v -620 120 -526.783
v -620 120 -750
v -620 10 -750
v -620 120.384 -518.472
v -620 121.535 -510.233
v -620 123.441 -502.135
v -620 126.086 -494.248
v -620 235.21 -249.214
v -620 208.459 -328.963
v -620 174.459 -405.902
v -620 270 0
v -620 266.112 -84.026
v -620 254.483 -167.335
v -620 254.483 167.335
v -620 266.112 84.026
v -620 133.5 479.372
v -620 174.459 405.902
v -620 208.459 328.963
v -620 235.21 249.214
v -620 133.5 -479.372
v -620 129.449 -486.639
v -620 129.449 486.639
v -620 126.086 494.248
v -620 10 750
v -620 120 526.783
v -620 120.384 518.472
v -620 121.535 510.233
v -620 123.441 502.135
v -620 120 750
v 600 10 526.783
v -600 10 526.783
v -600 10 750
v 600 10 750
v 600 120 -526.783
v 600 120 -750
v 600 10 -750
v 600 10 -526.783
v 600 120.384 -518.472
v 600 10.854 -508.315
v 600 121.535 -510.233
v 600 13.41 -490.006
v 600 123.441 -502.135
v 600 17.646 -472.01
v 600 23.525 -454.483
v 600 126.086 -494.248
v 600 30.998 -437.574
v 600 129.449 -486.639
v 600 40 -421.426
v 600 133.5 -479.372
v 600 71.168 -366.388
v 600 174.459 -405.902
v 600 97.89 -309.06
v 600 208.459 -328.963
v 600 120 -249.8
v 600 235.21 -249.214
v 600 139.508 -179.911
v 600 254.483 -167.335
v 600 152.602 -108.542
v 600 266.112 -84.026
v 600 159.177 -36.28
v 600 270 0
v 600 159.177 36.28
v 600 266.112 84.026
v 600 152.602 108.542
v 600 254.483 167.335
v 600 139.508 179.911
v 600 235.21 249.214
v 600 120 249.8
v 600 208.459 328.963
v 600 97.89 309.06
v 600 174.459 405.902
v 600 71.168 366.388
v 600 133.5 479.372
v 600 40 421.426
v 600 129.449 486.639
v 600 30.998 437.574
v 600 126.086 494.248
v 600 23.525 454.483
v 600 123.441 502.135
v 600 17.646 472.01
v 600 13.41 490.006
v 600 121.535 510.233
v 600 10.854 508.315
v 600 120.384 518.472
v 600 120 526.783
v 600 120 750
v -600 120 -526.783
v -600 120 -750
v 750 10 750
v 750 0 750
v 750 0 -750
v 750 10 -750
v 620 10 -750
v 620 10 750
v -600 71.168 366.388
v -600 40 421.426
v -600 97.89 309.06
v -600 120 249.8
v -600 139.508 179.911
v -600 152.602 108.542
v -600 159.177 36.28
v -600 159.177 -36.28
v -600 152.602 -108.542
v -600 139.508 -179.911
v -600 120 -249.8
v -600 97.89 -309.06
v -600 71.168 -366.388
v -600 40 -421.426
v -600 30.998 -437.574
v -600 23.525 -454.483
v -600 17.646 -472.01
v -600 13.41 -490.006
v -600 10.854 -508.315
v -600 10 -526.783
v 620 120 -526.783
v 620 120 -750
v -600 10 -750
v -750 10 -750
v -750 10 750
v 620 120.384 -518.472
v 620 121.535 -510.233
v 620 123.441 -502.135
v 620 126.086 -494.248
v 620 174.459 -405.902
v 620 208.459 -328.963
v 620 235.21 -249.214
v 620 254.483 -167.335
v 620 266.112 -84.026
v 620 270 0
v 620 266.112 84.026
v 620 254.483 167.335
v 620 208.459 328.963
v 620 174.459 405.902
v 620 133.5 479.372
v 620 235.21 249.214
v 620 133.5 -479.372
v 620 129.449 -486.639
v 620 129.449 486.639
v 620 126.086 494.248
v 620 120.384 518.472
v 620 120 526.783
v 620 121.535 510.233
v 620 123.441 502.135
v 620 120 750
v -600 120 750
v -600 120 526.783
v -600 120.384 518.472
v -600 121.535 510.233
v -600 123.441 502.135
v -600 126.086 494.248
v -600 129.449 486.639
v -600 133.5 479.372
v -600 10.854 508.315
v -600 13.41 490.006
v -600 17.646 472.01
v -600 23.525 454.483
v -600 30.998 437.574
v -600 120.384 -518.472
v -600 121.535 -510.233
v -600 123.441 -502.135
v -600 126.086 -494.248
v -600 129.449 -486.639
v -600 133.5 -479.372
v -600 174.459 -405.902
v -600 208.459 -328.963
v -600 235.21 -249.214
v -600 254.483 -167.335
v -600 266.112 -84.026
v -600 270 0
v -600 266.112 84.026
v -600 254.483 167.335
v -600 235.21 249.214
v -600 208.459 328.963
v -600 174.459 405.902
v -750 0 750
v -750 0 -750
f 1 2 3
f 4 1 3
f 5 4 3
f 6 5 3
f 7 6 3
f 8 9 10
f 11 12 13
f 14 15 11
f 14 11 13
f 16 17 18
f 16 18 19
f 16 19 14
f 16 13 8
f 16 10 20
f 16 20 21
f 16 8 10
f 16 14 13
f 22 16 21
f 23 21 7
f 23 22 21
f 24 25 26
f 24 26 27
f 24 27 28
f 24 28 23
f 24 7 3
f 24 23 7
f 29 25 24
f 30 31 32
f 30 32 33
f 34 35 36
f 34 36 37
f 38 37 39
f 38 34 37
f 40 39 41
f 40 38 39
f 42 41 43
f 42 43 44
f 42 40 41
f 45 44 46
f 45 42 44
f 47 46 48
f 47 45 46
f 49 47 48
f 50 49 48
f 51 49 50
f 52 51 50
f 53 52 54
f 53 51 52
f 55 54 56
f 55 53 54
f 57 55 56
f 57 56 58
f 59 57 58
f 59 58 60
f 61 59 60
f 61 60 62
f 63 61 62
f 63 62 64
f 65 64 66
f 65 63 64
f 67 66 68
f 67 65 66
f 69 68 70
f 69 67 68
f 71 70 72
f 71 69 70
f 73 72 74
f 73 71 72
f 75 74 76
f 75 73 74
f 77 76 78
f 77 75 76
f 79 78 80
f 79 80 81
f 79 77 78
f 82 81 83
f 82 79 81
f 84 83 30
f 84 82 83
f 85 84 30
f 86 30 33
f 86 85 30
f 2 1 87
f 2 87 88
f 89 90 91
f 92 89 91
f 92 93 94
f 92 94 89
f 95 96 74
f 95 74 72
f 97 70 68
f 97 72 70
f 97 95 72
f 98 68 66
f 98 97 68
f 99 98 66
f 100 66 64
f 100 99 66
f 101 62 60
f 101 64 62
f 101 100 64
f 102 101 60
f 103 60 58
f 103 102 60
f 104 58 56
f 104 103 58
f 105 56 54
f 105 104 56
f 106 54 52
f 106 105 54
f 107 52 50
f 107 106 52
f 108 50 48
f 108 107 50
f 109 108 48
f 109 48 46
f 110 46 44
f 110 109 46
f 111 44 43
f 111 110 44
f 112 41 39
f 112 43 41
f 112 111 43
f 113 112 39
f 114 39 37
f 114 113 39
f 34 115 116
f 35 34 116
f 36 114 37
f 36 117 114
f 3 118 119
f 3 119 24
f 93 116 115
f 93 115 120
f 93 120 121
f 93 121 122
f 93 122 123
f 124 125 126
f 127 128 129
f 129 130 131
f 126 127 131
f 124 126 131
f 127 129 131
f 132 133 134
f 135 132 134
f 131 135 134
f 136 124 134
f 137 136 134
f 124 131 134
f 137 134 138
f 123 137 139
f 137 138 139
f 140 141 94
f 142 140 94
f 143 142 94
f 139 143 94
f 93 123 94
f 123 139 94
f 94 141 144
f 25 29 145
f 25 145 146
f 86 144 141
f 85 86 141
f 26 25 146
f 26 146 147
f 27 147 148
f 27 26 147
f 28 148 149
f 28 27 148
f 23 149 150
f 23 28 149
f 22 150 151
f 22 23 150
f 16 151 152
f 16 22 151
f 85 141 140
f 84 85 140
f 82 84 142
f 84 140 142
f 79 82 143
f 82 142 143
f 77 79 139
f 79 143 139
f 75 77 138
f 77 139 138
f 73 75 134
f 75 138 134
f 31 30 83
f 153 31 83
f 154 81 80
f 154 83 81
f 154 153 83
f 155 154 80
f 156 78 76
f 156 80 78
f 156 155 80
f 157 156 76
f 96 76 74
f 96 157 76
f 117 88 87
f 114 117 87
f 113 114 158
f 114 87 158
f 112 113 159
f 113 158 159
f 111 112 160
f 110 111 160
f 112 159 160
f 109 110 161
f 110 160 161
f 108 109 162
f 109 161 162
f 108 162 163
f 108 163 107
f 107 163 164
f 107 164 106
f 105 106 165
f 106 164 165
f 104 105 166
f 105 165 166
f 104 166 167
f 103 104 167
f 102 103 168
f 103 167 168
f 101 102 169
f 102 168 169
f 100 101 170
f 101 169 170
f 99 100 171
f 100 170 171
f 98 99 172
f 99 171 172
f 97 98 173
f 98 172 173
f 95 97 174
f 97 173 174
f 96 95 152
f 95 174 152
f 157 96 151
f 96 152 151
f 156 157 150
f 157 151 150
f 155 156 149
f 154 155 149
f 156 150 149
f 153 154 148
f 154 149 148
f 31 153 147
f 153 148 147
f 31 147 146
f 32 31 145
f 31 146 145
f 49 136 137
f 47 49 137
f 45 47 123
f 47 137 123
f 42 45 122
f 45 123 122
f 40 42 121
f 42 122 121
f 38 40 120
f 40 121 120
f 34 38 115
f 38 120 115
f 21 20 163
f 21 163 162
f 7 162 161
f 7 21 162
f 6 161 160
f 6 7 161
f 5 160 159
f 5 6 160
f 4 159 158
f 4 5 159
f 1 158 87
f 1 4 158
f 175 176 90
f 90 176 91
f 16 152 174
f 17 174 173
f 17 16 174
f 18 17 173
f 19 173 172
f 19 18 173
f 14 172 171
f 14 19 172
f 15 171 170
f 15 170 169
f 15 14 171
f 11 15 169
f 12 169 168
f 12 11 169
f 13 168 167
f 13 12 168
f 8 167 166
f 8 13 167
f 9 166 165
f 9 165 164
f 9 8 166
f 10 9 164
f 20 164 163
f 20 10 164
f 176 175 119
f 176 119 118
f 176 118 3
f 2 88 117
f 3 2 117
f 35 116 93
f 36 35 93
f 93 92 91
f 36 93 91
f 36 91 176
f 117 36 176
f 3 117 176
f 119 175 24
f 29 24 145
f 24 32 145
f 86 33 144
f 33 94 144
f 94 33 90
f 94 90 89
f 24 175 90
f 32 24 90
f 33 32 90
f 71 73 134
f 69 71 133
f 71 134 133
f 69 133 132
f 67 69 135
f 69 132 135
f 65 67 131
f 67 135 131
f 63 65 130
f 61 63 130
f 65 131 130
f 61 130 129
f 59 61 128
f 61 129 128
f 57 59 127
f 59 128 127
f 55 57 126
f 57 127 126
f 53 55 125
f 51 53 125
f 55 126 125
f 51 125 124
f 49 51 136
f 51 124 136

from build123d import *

# Parameters (mm, degrees)
SKETCH2_W           = 1500
SKETCH2_H           = 1500
BOSS_EXTRUDE1_DEPTH = 10
BOSS_EXTRUDE3_DEPTH = 1240
BOSS_EXTRUDE4_DEPTH = 20


with BuildPart() as part:
    # Sketch2 → Boss-Extrude1 (new body)
    with BuildSketch(Plane(origin=(0, 0, 0), x_dir=(1, 0, 0), z_dir=(0, 1, 0))):
        Rectangle(SKETCH2_W, SKETCH2_H)
    extrude(amount=BOSS_EXTRUDE1_DEPTH)

    # Sketch4 → Boss-Extrude3 (add)
    with BuildSketch(Plane.ZY.offset(620)):
        with BuildLine():
            ThreePointArc((-421.426148374, 40.000001079), (-472.010430907, 17.646159664), (-526.782687643, 10))
            Line((-526.782687643, 10), (-466.368952654, 10))
            ThreePointArc((-466.368952654, 10), (-444.150915082, 25.379564333), (-421.426148373, 40.000001079))
        make_face()
        with BuildLine():
            ThreePointArc((-421.426148373, 40.000001079), (-444.150915082, 25.379564333), (-466.368952654, 10))
            Line((-466.368952654, 10), (466.368952654, 10))
            ThreePointArc((466.368952654, 10), (444.150917669, 25.379562606), (421.426153659, 39.999997803))
            ThreePointArc((421.426153659, 39.999997803), (3.109e-06, 160), (-421.426148373, 40.000001079))
        make_face()
        with BuildLine():
            ThreePointArc((421.426153659, 39.999997803), (444.150917669, 25.379562606), (466.368952654, 10))
            Line((466.368952654, 10), (526.782687643, 10))
            ThreePointArc((526.782687643, 10), (472.010433898, 17.646158812), (421.426153659, 39.999997803))
        make_face()
    extrude(amount=-BOSS_EXTRUDE3_DEPTH)

    # Sketch5 → Boss-Extrude4 (add)
    with BuildSketch(Plane.ZY.offset(620)):
        with BuildLine():
            Line((-750, 120), (-750, 10))
            Line((-750, 10), (-526.782687643, 10))
            ThreePointArc((-526.782687643, 10), (-472.010431892, 17.646159383), (-421.426150114, 40))
            ThreePointArc((-421.426150114, 40), (-337.988327134, 85.095780378), (-249.799919936, 120))
            Line((-249.799919936, 120), (-526.782687643, 120))
            Line((-526.782687643, 120), (-750, 120))
        make_face()
        with BuildLine():
            ThreePointArc((-479.372245755, 133.5), (-502.135172555, 123.440771722), (-526.782687643, 120))
            Line((-526.782687643, 120), (-249.799919936, 120))
            ThreePointArc((-249.799919936, 120), (0, 160), (249.799919936, 120))
            Line((249.799919936, 120), (526.782687643, 120))
            ThreePointArc((526.782687643, 120), (502.135172555, 123.440771722), (479.372245755, 133.5))
            ThreePointArc((479.372245755, 133.5), (0, 270), (-479.372245755, 133.5))
        make_face()
        with BuildLine():
            ThreePointArc((421.426150114, 40), (472.010431892, 17.646159383), (526.782687643, 10))
            Line((526.782687643, 10), (750, 10))
            Line((750, 10), (750, 120))
            Line((750, 120), (526.782687643, 120))
            Line((526.782687643, 120), (249.799919936, 120))
            ThreePointArc((249.799919936, 120), (337.988327134, 85.095780378), (421.426150114, 40))
        make_face()
    boss_extrude4 = extrude(amount=-BOSS_EXTRUDE4_DEPTH)

    # Mirror1: Boss-Extrude4 across plane
    add(boss_extrude4.mirror(Plane(origin=(0, 0, 0), x_dir=(0, 0, 1), z_dir=(1, 0, 0))))


solid = part.part
